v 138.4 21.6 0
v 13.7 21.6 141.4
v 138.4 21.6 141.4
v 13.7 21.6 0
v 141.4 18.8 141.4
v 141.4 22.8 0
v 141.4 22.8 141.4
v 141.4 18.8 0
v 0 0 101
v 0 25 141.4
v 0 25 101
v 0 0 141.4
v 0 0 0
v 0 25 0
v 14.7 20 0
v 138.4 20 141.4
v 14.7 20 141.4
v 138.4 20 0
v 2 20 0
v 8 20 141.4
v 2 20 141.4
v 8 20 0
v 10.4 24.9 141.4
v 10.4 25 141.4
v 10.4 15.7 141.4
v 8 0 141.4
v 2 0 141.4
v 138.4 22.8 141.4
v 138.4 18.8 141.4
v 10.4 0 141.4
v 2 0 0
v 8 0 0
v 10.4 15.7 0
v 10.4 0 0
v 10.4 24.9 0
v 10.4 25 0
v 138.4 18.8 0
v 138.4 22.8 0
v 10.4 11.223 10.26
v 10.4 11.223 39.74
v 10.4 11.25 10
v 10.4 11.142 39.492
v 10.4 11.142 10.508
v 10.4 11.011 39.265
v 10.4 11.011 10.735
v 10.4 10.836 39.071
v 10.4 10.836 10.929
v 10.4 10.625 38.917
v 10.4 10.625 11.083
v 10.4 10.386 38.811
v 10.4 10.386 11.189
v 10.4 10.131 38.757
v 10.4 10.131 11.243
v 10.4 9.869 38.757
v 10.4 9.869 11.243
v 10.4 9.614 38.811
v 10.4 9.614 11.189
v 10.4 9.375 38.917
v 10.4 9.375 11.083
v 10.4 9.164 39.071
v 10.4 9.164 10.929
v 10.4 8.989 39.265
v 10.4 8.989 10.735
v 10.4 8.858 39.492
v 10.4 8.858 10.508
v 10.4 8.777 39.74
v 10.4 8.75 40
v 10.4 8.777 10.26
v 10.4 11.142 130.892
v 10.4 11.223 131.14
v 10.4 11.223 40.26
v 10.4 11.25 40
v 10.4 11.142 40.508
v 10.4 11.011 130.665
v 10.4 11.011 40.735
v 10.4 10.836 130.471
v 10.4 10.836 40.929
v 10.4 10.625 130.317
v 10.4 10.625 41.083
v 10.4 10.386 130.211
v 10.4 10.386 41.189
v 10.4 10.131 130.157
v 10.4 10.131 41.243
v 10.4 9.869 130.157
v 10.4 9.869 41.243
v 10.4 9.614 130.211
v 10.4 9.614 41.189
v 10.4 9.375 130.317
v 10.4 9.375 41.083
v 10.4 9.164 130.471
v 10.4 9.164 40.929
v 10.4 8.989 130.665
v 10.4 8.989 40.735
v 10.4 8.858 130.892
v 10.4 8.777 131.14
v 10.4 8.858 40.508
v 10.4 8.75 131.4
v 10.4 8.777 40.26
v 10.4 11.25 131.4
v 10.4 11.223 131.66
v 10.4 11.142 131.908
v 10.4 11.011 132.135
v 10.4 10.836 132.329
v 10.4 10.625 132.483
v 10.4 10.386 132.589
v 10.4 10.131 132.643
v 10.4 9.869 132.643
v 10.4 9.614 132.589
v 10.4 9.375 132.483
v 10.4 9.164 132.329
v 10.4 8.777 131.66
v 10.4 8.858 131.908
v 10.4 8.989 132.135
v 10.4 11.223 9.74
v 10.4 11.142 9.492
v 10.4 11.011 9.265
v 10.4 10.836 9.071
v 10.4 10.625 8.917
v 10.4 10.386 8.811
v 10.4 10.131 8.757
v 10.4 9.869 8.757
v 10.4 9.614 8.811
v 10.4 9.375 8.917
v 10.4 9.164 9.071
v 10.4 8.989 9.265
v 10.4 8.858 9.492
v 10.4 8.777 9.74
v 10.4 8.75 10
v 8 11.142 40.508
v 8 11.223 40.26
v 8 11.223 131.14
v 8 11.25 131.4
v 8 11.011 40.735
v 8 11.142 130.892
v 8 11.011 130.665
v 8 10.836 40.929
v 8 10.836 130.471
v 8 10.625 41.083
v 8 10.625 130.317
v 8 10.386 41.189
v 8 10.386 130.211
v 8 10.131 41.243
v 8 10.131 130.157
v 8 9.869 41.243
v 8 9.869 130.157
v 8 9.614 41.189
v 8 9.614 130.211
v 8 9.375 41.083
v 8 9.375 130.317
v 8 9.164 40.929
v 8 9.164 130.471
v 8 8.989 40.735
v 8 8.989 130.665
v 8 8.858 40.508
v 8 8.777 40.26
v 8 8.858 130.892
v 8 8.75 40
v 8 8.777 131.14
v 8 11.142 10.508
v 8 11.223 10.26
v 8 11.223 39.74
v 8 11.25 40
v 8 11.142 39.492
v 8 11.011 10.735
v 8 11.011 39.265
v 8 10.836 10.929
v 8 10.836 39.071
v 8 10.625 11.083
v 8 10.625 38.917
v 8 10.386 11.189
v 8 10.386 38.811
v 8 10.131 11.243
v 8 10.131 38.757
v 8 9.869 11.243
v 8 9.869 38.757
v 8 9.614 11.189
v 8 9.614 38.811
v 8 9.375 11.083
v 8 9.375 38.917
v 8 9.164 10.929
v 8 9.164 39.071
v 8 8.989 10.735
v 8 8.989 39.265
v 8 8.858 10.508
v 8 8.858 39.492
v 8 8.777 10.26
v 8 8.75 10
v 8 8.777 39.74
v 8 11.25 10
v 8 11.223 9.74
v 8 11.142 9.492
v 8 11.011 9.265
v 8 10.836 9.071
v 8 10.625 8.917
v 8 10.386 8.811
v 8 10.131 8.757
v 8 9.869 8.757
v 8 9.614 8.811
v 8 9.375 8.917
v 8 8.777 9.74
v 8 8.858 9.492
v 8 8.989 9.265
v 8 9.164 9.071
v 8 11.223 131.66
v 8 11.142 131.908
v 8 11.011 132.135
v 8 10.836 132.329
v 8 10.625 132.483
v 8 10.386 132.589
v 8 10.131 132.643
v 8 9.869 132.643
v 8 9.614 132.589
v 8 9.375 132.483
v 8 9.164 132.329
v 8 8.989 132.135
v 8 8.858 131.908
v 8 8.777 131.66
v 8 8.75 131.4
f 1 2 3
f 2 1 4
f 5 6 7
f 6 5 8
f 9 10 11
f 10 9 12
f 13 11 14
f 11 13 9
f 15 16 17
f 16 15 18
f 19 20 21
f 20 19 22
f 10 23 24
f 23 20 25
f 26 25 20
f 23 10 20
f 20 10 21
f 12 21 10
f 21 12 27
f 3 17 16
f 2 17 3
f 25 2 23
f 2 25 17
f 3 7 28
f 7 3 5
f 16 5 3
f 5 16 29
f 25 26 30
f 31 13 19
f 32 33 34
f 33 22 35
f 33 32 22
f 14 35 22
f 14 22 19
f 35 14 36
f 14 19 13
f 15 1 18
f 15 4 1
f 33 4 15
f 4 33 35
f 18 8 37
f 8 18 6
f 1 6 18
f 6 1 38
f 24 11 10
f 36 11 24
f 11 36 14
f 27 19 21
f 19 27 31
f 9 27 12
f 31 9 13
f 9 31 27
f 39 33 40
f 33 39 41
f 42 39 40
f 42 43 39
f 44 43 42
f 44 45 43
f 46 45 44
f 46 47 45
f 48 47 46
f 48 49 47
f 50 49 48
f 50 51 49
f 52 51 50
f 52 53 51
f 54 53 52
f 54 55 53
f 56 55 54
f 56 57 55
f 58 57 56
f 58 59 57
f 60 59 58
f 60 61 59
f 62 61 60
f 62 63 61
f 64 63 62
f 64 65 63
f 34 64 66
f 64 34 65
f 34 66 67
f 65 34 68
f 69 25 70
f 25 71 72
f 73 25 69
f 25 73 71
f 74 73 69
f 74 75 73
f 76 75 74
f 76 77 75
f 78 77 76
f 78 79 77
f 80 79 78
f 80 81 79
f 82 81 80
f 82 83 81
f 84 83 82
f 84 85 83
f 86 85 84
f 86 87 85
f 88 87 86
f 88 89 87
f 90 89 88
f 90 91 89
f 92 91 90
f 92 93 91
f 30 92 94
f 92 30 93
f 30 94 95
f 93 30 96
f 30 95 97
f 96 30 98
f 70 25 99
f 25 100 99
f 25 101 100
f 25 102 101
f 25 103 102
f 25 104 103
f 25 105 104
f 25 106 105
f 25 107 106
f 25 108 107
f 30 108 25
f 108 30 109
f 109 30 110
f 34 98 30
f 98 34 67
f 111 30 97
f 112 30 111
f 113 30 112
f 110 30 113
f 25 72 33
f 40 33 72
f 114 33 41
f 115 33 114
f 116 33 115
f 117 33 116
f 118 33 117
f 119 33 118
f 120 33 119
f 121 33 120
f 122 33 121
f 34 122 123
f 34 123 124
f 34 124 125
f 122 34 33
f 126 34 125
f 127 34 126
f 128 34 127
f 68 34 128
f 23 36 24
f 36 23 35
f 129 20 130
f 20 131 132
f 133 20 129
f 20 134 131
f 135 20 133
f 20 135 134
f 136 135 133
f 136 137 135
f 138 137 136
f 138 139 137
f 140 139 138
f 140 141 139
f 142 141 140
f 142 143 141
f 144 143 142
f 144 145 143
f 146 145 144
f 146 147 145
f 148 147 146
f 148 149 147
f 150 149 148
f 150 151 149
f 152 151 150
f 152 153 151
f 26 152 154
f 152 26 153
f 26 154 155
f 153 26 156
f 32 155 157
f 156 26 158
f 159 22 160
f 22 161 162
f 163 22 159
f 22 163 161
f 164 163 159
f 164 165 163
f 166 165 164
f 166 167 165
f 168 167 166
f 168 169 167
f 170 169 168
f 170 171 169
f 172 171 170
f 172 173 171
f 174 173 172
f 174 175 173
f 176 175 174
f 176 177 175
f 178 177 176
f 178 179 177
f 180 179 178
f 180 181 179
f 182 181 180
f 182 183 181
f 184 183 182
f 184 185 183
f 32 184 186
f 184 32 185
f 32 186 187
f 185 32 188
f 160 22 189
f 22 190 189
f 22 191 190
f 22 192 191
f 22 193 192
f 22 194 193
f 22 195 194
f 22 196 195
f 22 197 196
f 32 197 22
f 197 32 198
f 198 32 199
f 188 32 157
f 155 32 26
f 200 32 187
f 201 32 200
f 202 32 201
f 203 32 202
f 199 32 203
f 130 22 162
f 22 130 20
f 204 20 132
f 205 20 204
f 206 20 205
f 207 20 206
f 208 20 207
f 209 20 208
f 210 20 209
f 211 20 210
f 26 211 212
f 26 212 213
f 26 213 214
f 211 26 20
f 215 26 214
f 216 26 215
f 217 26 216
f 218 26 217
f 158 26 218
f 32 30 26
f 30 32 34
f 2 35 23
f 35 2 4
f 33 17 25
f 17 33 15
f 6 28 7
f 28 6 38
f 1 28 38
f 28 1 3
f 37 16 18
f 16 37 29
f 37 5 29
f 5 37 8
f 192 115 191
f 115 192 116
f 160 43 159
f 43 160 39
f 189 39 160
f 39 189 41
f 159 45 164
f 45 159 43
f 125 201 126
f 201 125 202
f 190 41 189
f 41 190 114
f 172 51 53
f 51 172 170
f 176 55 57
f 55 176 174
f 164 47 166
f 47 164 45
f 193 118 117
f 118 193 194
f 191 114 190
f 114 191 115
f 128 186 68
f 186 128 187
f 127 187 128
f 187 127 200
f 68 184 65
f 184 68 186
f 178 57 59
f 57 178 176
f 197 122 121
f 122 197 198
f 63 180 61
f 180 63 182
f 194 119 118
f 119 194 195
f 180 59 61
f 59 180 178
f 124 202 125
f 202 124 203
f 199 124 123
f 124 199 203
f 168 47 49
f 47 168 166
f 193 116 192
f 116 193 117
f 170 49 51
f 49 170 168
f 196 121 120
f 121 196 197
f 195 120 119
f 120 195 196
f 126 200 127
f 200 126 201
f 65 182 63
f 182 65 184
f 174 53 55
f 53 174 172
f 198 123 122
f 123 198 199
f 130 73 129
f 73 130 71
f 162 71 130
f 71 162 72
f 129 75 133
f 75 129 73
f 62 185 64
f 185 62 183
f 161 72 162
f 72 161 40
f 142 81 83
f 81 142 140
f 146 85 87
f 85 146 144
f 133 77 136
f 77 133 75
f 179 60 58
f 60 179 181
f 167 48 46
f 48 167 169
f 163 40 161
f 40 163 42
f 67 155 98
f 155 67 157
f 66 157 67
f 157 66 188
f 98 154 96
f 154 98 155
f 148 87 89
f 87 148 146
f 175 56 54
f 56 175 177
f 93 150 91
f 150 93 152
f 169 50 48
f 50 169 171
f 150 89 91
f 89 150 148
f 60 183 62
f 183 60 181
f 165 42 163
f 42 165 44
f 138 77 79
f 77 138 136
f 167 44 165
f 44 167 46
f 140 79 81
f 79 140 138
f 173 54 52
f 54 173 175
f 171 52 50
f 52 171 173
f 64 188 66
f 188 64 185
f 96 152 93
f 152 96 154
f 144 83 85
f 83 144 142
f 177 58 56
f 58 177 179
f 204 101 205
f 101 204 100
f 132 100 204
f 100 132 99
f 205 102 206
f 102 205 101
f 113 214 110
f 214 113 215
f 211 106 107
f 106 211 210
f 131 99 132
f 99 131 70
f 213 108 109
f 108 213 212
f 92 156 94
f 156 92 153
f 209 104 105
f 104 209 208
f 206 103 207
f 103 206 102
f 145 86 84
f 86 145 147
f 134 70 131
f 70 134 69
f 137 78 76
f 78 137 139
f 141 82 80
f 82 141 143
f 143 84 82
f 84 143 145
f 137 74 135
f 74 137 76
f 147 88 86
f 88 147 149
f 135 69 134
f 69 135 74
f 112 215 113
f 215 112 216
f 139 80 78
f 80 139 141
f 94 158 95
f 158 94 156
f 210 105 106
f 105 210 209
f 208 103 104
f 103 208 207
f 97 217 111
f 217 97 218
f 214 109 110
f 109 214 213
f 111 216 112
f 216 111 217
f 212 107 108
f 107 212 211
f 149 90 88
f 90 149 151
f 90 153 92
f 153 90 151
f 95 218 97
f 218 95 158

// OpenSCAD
$fn = 30;
SAIL_THICKNESS = 1.6;
SAIL_WIDTH = 141.4;
SAIL_HEIGHT = 141.4;
FRAME_WIDTH = 3;
FRAME_THICK = 4;

HOLDER_HEIGHT = SAIL_HEIGHT;

rotate([90,0,90]) sail();


module sail(){
    difference(){
        union(){
            translate([20,0,0]) cube([SAIL_THICKNESS,SAIL_HEIGHT,SAIL_WIDTH]);
            
            // Holder
            translate([0,0,0]) cube([25,HOLDER_HEIGHT,2]);
            translate([0,0,2 + 6]) cube([25,HOLDER_HEIGHT,2.4]);
            translate([20,0,0]) cube([5,HOLDER_HEIGHT,2 + 6 + 2.4]);
            
            translate([20.3,0,15]) rotate([0,135,0]) cube([7,HOLDER_HEIGHT,6.6]);
            
            // Frame
            translate([20-(FRAME_THICK-SAIL_THICKNESS)/2,0,0]) cube([FRAME_THICK,SAIL_HEIGHT,FRAME_WIDTH]);
            translate([20-(FRAME_THICK-SAIL_THICKNESS)/2,0,SAIL_WIDTH-FRAME_WIDTH]) cube([FRAME_THICK,SAIL_HEIGHT,FRAME_WIDTH]);
            
            
        }
        
        // Bottom flat
        translate([-1,-1,-10]) cube([102,102,10]);
        translate([0,-0.1,2]) cube([20,HOLDER_HEIGHT+1,6]);
        
        // Screwholes
        translate([10,10,5]) cylinder(10,d=2.5);
        translate([10,40,5]) cylinder(10,d=2.5);
        
        translate([10,HOLDER_HEIGHT-10,5]) cylinder(10,d=2.5);
        
        
    }
}
